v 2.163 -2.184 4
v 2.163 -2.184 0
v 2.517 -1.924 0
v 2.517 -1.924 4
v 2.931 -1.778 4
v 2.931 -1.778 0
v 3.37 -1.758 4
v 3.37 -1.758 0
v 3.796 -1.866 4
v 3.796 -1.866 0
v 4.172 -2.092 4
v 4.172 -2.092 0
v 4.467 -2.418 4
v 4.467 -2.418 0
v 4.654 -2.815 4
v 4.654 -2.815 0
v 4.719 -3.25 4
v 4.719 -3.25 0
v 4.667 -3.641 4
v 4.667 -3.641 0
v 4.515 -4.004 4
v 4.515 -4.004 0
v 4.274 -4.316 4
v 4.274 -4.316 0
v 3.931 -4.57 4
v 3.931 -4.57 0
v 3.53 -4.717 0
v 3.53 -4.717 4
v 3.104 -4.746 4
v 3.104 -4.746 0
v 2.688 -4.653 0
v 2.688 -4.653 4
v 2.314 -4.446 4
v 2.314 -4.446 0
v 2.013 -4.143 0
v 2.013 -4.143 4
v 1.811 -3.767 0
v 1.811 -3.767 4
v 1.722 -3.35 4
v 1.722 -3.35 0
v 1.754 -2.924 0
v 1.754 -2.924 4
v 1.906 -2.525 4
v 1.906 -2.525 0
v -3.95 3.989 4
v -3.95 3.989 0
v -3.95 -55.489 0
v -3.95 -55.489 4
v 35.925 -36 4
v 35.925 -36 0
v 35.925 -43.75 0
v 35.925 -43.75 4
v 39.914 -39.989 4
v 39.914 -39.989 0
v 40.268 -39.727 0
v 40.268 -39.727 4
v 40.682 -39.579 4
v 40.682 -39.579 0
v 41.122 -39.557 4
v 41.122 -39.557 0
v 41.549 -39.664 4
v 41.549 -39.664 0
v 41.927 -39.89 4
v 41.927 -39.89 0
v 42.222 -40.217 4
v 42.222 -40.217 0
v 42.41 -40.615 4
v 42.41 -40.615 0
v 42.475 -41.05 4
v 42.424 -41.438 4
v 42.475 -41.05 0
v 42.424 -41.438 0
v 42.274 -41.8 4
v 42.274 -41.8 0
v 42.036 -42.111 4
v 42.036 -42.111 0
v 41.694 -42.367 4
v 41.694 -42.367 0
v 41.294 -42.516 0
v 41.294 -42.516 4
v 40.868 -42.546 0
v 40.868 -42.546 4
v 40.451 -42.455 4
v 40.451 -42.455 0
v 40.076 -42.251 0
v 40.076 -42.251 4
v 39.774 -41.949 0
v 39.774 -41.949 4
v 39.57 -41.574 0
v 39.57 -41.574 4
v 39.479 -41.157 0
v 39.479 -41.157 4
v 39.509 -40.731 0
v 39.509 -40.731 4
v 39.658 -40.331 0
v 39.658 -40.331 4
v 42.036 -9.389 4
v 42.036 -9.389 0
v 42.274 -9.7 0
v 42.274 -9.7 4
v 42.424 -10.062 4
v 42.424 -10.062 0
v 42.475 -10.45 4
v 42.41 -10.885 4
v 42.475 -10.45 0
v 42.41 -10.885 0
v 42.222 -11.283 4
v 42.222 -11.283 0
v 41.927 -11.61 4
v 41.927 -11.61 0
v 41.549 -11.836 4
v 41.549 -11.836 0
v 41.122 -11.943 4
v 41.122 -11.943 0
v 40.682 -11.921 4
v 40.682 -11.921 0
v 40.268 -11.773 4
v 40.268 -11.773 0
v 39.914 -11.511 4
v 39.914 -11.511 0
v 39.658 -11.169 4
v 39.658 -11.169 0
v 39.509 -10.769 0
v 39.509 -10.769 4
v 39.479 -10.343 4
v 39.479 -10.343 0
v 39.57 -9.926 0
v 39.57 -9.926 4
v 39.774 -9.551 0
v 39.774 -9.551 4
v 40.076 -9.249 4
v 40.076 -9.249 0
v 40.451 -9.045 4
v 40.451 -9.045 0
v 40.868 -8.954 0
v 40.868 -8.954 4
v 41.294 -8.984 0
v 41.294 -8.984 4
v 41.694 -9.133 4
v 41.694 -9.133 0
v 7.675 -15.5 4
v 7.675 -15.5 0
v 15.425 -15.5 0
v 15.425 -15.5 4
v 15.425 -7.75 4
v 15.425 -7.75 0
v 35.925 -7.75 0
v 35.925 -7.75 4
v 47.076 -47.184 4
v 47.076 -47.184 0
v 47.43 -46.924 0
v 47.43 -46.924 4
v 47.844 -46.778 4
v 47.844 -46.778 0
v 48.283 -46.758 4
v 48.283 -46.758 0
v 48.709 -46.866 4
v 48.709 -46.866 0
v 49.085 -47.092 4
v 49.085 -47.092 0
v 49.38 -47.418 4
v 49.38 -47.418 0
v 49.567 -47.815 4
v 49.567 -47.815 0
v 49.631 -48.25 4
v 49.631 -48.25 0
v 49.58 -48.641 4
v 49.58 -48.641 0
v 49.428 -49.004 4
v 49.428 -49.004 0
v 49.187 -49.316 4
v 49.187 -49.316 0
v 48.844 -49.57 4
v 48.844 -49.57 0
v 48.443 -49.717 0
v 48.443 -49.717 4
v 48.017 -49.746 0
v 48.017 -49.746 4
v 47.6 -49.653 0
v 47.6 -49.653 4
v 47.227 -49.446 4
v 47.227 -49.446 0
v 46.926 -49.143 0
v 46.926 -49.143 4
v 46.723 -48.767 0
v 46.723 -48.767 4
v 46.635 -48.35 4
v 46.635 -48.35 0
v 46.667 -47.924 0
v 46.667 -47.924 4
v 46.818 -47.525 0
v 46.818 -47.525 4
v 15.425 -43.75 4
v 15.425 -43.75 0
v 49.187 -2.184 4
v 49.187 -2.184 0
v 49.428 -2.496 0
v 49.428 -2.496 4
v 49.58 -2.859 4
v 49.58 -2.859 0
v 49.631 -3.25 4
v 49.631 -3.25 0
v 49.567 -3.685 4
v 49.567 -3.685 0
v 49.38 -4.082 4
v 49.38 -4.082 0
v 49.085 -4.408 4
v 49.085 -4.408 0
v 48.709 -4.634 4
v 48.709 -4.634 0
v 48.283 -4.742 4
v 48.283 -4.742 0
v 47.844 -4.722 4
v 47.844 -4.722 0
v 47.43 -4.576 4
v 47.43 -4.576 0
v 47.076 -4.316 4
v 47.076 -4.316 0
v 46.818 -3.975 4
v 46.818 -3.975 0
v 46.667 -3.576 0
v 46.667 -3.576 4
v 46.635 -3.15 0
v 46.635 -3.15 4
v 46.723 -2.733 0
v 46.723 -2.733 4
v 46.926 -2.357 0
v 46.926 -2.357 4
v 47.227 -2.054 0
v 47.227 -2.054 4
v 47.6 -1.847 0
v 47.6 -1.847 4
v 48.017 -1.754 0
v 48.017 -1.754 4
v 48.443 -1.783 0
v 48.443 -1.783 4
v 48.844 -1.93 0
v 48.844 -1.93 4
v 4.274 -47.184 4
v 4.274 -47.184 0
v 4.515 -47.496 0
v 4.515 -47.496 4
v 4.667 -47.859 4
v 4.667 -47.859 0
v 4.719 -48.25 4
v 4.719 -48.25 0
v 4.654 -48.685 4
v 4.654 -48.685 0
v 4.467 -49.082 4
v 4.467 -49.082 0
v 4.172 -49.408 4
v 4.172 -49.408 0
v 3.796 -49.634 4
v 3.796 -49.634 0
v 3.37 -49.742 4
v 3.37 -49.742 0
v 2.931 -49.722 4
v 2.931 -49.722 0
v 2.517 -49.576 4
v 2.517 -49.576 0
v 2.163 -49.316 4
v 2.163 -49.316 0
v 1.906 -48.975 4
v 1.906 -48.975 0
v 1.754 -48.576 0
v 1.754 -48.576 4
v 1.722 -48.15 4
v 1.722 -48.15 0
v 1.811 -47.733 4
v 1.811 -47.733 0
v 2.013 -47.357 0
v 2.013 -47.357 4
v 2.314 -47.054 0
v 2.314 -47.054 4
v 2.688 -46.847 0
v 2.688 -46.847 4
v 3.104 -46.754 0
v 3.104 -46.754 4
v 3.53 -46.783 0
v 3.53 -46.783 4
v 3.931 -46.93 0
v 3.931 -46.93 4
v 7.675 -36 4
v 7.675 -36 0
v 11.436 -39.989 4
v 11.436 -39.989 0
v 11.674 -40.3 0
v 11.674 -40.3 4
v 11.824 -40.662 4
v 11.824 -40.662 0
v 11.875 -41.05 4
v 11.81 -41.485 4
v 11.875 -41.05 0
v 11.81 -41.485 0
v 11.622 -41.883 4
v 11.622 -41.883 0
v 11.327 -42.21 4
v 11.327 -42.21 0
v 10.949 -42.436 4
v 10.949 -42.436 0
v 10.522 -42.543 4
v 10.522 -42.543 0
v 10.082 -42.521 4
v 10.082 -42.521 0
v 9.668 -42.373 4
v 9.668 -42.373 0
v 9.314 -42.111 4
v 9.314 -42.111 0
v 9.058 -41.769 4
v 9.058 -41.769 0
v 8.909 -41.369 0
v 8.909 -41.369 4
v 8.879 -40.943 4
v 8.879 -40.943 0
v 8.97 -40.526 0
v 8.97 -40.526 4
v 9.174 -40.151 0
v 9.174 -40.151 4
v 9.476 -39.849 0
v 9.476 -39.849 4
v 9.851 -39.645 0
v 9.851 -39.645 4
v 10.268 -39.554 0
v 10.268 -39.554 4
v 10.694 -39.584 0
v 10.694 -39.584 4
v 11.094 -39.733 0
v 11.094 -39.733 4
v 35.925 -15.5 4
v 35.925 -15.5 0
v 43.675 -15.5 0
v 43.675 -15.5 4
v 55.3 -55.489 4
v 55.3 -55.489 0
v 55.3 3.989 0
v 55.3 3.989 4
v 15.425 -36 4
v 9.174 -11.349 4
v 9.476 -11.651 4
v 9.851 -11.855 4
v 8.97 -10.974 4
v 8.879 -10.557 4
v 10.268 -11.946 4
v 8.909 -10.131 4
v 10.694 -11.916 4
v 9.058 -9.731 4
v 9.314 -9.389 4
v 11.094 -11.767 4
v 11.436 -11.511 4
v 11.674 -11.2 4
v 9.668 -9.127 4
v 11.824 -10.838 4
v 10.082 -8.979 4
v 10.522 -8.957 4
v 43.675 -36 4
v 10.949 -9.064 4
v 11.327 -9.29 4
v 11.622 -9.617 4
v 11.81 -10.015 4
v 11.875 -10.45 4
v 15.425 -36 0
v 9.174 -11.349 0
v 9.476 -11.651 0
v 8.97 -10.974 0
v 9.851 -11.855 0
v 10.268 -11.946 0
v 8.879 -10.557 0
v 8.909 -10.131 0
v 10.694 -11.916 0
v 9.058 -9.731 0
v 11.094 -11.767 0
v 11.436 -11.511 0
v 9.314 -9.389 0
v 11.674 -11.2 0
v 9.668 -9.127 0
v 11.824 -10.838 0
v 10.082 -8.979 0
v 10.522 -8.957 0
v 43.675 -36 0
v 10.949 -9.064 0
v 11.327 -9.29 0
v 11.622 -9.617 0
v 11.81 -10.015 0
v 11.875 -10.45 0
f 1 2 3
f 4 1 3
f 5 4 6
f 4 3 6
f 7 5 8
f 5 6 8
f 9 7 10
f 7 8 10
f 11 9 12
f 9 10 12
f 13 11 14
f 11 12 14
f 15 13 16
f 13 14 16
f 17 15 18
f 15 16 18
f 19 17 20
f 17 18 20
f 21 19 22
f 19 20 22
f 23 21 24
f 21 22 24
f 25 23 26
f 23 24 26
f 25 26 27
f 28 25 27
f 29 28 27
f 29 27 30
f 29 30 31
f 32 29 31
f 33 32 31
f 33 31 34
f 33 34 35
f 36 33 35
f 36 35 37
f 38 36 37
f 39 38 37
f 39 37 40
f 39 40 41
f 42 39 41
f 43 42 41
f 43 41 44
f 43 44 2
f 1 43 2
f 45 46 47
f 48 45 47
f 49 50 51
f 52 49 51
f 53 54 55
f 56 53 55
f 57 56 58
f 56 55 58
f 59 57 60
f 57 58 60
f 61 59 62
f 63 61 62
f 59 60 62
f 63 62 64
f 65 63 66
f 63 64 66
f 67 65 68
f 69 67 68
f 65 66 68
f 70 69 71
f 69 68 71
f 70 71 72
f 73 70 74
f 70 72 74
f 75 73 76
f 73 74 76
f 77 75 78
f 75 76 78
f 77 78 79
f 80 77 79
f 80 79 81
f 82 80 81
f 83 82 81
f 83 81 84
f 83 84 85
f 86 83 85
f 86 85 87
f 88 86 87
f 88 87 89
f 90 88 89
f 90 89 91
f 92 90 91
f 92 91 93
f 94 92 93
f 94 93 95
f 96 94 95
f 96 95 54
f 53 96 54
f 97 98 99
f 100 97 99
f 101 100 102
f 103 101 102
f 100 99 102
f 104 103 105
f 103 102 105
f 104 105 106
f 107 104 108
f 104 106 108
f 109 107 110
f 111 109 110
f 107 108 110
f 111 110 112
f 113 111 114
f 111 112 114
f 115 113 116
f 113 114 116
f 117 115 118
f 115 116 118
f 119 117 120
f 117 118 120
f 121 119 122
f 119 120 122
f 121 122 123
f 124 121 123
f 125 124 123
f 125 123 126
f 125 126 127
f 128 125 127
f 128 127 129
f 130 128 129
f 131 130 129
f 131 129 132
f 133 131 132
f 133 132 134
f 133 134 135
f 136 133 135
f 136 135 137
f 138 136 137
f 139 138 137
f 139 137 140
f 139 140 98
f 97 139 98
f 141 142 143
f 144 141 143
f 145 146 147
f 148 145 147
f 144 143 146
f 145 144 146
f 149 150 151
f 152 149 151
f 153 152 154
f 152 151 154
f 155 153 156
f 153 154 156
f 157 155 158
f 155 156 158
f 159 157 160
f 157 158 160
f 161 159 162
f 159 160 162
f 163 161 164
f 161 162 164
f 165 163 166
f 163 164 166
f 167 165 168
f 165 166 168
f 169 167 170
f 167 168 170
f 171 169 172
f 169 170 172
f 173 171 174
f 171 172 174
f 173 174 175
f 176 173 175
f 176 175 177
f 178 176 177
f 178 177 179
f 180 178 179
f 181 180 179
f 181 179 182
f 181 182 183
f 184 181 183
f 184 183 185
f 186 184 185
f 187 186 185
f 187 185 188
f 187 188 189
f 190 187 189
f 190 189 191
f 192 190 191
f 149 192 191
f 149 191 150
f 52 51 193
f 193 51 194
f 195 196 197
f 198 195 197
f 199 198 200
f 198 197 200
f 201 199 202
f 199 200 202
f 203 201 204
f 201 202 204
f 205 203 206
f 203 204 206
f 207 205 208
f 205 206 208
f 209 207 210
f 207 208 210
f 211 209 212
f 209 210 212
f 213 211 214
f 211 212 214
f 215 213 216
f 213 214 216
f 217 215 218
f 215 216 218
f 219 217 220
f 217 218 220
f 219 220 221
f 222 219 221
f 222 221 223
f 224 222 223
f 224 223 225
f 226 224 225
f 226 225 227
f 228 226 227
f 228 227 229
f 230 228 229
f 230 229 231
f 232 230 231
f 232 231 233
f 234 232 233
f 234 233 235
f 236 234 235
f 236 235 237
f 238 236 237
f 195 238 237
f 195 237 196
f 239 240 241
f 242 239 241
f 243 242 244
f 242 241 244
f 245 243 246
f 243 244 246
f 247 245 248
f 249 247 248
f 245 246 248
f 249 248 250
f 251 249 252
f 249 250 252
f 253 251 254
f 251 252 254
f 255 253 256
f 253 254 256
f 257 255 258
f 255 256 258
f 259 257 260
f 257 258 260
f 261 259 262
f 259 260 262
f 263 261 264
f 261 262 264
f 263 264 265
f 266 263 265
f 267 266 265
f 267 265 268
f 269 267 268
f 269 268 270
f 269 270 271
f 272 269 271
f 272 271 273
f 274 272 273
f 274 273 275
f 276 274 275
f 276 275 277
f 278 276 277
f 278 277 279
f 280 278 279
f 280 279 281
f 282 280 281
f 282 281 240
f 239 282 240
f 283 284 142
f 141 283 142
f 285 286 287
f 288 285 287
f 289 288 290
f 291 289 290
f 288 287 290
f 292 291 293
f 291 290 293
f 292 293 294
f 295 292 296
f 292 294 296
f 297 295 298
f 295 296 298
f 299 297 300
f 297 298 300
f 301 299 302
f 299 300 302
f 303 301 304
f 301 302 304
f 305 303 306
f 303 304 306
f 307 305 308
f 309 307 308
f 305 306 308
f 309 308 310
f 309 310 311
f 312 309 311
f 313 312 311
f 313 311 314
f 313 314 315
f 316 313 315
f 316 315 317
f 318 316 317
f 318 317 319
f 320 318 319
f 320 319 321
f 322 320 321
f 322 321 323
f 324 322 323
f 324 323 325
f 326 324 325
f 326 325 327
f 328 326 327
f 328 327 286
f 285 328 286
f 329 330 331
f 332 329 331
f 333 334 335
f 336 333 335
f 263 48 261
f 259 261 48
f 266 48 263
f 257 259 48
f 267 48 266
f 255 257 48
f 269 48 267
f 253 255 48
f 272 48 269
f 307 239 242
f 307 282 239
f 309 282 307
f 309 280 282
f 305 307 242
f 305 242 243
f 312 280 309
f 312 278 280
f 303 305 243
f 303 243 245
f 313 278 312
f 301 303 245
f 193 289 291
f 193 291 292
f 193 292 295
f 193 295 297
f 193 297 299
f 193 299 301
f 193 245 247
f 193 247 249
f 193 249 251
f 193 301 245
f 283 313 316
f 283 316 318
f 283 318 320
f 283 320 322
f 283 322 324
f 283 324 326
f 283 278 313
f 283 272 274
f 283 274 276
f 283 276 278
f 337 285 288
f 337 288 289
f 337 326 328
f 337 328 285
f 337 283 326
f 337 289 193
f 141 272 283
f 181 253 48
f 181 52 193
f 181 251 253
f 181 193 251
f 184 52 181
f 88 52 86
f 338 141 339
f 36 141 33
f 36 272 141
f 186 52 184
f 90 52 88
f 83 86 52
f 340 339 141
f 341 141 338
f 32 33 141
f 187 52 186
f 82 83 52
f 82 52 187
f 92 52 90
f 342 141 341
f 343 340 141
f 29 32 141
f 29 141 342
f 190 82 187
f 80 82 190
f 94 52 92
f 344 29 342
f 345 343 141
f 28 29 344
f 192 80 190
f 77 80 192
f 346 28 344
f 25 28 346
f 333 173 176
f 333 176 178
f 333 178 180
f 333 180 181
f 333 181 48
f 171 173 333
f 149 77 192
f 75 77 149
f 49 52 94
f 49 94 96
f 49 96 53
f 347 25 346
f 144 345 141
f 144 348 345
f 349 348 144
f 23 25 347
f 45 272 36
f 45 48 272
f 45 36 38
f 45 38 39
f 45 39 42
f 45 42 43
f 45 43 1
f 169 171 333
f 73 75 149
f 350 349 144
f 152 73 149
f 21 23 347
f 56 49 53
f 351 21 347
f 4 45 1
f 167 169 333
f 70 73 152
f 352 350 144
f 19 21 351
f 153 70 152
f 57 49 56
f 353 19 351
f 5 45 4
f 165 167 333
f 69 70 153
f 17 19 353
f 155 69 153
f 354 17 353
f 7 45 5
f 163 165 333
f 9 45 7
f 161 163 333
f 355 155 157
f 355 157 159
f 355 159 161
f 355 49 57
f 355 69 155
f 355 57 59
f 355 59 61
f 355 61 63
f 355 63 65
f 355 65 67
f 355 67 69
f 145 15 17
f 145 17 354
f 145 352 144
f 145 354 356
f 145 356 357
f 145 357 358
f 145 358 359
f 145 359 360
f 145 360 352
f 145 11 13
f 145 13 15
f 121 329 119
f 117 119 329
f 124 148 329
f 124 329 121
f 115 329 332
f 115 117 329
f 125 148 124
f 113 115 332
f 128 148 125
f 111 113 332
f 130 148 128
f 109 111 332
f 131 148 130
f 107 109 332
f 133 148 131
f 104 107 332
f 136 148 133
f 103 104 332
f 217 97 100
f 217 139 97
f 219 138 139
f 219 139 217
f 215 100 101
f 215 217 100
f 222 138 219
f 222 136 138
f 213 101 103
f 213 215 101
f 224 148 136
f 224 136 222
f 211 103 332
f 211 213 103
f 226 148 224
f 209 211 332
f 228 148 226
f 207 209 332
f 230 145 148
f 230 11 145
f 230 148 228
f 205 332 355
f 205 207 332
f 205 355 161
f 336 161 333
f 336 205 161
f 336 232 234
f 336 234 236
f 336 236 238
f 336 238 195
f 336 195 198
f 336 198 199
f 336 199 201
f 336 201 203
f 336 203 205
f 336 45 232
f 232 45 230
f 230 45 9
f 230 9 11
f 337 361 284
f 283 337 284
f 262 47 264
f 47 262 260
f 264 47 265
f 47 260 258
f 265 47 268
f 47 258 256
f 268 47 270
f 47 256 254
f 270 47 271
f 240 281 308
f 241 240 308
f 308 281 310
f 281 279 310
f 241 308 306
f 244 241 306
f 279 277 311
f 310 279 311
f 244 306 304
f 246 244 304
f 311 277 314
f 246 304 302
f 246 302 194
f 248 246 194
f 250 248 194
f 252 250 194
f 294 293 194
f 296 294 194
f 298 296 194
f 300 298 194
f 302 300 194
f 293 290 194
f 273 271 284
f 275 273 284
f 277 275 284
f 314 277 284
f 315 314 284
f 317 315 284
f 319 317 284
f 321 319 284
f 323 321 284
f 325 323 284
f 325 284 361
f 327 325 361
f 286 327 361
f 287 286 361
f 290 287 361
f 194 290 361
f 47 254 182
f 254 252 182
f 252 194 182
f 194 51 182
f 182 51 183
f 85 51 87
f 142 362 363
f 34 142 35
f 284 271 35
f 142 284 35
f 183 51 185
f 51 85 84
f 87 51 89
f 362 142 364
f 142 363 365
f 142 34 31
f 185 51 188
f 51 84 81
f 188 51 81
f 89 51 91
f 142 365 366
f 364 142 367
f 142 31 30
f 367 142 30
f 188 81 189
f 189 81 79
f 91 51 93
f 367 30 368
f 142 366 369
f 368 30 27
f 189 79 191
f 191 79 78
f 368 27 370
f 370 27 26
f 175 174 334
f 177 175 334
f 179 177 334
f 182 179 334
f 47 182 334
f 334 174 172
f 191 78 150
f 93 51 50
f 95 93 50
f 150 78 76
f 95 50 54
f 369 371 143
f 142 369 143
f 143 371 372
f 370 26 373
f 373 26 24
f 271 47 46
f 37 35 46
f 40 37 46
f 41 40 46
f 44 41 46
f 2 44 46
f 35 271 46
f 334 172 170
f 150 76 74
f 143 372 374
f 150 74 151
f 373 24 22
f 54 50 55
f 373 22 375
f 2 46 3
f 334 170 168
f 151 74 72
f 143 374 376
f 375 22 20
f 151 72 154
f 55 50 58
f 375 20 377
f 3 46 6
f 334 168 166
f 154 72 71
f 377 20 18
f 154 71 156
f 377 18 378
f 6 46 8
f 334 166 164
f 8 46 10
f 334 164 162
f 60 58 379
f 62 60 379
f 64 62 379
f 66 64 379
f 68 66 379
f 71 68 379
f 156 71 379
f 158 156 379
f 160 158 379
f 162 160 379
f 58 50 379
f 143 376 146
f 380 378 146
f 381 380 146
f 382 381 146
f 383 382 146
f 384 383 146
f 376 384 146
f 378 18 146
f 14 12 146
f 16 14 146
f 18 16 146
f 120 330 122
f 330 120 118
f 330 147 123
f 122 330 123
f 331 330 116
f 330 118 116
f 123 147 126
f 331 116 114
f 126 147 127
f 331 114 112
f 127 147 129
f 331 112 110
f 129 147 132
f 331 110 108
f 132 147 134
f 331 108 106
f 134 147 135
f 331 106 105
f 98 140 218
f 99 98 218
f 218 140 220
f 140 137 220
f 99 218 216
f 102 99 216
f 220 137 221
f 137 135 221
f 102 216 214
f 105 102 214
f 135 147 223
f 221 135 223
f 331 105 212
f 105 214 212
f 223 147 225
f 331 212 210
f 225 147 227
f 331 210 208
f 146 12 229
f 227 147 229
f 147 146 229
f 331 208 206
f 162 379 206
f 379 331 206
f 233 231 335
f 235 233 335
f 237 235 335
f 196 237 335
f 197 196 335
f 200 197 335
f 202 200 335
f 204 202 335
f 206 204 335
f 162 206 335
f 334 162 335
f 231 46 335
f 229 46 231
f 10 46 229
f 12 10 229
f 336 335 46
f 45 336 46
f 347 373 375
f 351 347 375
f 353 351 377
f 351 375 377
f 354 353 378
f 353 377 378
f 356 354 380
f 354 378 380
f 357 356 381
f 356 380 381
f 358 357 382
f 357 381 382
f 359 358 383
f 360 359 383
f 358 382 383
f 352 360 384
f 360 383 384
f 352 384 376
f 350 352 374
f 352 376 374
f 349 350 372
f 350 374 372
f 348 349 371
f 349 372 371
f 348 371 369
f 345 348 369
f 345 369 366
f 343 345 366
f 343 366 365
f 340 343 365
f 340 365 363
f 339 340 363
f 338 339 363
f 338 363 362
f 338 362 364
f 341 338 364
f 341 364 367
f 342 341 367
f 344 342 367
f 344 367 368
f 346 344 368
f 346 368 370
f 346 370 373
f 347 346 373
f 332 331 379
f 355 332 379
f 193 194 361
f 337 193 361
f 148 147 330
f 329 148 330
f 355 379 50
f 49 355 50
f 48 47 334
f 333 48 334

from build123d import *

# Parameters (mm, degrees)
F1_DEPTH = 2
F2_DEPTH = 4


with BuildPart() as f1:
    # F0 (on Top) → F1 (new body)
    with BuildSketch(Plane.XY):
        Polygon((0, -7.75), (0, -43.674267101), (7.675, -43.674267101), (7.675, -36), (7.675, -25.75), (7.675, -15.5), (7.675, -7.75), align=None)
        with BuildLine():
            Line((0, 0), (0, -7.75))
            Line((0, -7.75), (7.675, -7.75))
            Line((7.675, -7.75), (4.2740389016, -4.3158047541))
            ThreePointArc((4.2740389016, -4.3158047541), (2.152743633, -4.3054905145), (2.1630578726, -2.1841952459))
            Line((2.1630578726, -2.1841952459), (0, 0))
        make_face()
        with BuildLine():
            Line((7.675, 0), (0, 0))
            Line((0, 0), (2.1630578726, -2.1841952459))
            ThreePointArc((2.1630578726, -2.1841952459), (3.7959409001, -1.8655803072), (4.7185483871, -3.25))
            ThreePointArc((4.7185483871, -3.25), (4.6029680799, -3.827392513), (4.2740389016, -4.3158047541))
            Line((4.2740389016, -4.3158047541), (7.675, -7.75))
            Line((7.675, -7.75), (7.675, 0))
        make_face()
        Polygon((7.675, 0), (7.675, -7.75), (15.425, -7.75), (25.675, -7.75), (35.925, -7.75), (43.6, -7.75), (43.6, 0), align=None)
        Polygon((43.675, -36), (43.675, -43.75), (51.35, -43.75), (51.35, -7.825732899), (43.675, -7.825732899), (43.675, -15.5), (43.675, -25.75), align=None)
        Polygon((43.6, -7.825732899), (43.675, -7.825732899), (43.675, -7.75), (43.6, -7.825), align=None)
        with BuildLine():
            Line((51.35, -7.825732899), (51.35, 0))
            Line((51.35, 0), (49.1869421274, -2.1841952459))
            ThreePointArc((49.1869421274, -2.1841952459), (49.5158713057, -2.672607487), (49.6314516129, -3.25))
            ThreePointArc((49.6314516129, -3.25), (48.7088441259, -4.6344196928), (47.0759610984, -4.3158047541))
            Line((47.0759610984, -4.3158047541), (43.675, -7.75))
            Line((43.675, -7.75), (43.675, -7.825732899))
            Line((43.675, -7.825732899), (51.35, -7.825732899))
        make_face()
        with BuildLine():
            Line((49.1869421274, -2.1841952459), (51.35, 0))
            Line((51.35, 0), (43.6, 0))
            Line((43.6, 0), (43.6, -7.75))
            Line((43.6, -7.75), (43.675, -7.75))
            Line((43.675, -7.75), (47.0759610984, -4.3158047541))
            ThreePointArc((47.0759610984, -4.3158047541), (47.0656468588, -2.1945094855), (49.1869421274, -2.1841952459))
        make_face()
        with BuildLine():
            Line((9.3143398282, -9.3893398282), (7.675, -7.75))
            Line((7.675, -7.75), (7.675, -15.5))
            Line((7.675, -15.5), (11.55, -11.625))
            Line((11.55, -11.625), (11.4356601718, -11.5106601718))
            ThreePointArc((11.4356601718, -11.5106601718), (9.3143398282, -11.5106601718), (9.3143398282, -9.3893398282))
        make_face()
        Polygon((11.55, -11.625), (7.675, -15.5), (15.425, -15.5), align=None)
        Polygon((15.425, -15.5), (15.425, -7.75), (11.55, -11.625), align=None)
        with BuildLine():
            Line((15.425, -7.75), (7.675, -7.75))
            Line((7.675, -7.75), (9.3143398282, -9.3893398282))
            ThreePointArc((9.3143398282, -9.3893398282), (10.9490251485, -9.0641807012), (11.875, -10.45))
            ThreePointArc((11.875, -10.45), (11.7608192988, -11.0240251485), (11.4356601718, -11.5106601718))
            Line((11.4356601718, -11.5106601718), (11.55, -11.625))
            Line((11.55, -11.625), (15.425, -7.75))
        make_face()
        Polygon((39.8, -39.875), (43.675, -36), (35.925, -36), align=None)
        Polygon((35.925, -36), (35.925, -43.75), (39.8, -39.875), align=None)
        with BuildLine():
            Line((35.925, -43.75), (43.675, -43.75))
            Line((43.675, -43.75), (42.0356601718, -42.1106601718))
            ThreePointArc((42.0356601718, -42.1106601718), (39.9143398282, -42.1106601718), (39.9143398282, -39.9893398282))
            Line((39.9143398282, -39.9893398282), (39.8, -39.875))
            Line((39.8, -39.875), (35.925, -43.75))
        make_face()
        Polygon((7.75, -43.75), (7.75, -51.5), (43.675, -51.5), (43.675, -43.75), (35.925, -43.75), (25.675, -43.75), (15.425, -43.75), align=None)
        with BuildLine():
            Line((42.0356601718, -42.1106601718), (43.675, -43.75))
            Line((43.675, -43.75), (43.675, -36))
            Line((43.675, -36), (39.8, -39.875))
            Line((39.8, -39.875), (39.9143398282, -39.9893398282))
            ThreePointArc((39.9143398282, -39.9893398282), (41.5490251485, -39.6641807012), (42.475, -41.05))
            ThreePointArc((42.475, -41.05), (42.3608192988, -41.6240251485), (42.0356601718, -42.1106601718))
        make_face()
        Polygon((7.675, -43.75), (7.75, -43.75), (7.75, -43.675), align=None)
        with BuildLine():
            Line((7.75, -43.675), (7.75, -43.75))
            Line((7.75, -43.75), (15.425, -43.75))
            Line((15.425, -43.75), (11.55, -39.875))
            Line((11.55, -39.875), (11.4356601718, -39.9893398282))
            ThreePointArc((11.4356601718, -39.9893398282), (11.7608192988, -40.4759748515), (11.875, -41.05))
            ThreePointArc((11.875, -41.05), (10.9490251485, -42.4358192988), (9.3143398282, -42.1106601718))
            Line((9.3143398282, -42.1106601718), (7.75, -43.675))
        make_face()
        Polygon((7.75, -43.674267101), (7.675, -43.674267101), (7.675, -43.75), (7.75, -43.675), align=None)
        with BuildLine():
            Line((7.675, -36), (7.675, -43.674267101))
            Line((7.675, -43.674267101), (7.75, -43.674267101))
            Line((7.75, -43.674267101), (7.75, -43.675))
            Line((7.75, -43.675), (9.3143398282, -42.1106601718))
            ThreePointArc((9.3143398282, -42.1106601718), (9.3143398282, -39.9893398282), (11.4356601718, -39.9893398282))
            Line((11.4356601718, -39.9893398282), (11.55, -39.875))
            Line((11.55, -39.875), (7.675, -36))
        make_face()
        with BuildLine():
            Line((0, -43.674267101), (0, -51.5))
            Line((0, -51.5), (2.1630578726, -49.3158047541))
            ThreePointArc((2.1630578726, -49.3158047541), (2.152743633, -47.1945094855), (4.2740389016, -47.1841952459))
            Line((4.2740389016, -47.1841952459), (7.675, -43.75))
            Line((7.675, -43.75), (7.675, -43.674267101))
            Line((7.675, -43.674267101), (0, -43.674267101))
        make_face()
        with BuildLine():
            Line((2.1630578726, -49.3158047541), (0, -51.5))
            Line((0, -51.5), (7.75, -51.5))
            Line((7.75, -51.5), (7.75, -43.75))
            Line((7.75, -43.75), (7.675, -43.75))
            Line((7.675, -43.75), (4.2740389016, -47.1841952459))
            ThreePointArc((4.2740389016, -47.1841952459), (4.6029680799, -47.672607487), (4.7185483871, -48.25))
            ThreePointArc((4.7185483871, -48.25), (3.7959409001, -49.6344196928), (2.1630578726, -49.3158047541))
        make_face()
        with BuildLine():
            Line((43.675, -43.75), (43.675, -51.5))
            Line((43.675, -51.5), (51.35, -51.5))
            Line((51.35, -51.5), (49.1869421274, -49.3158047541))
            ThreePointArc((49.1869421274, -49.3158047541), (47.0656468588, -49.3054905145), (47.0759610984, -47.1841952459))
            Line((47.0759610984, -47.1841952459), (43.675, -43.75))
        make_face()
        with BuildLine():
            Line((49.1869421274, -49.3158047541), (51.35, -51.5))
            Line((51.35, -51.5), (51.35, -43.75))
            Line((51.35, -43.75), (43.675, -43.75))
            Line((43.675, -43.75), (47.0759610984, -47.1841952459))
            ThreePointArc((47.0759610984, -47.1841952459), (48.7088441259, -46.8655803072), (49.6314516129, -48.25))
            ThreePointArc((49.6314516129, -48.25), (49.5158713057, -48.827392513), (49.1869421274, -49.3158047541))
        make_face()
        Polygon((15.425, -36), (7.675, -36), (11.55, -39.875), align=None)
        Polygon((11.55, -39.875), (15.425, -43.75), (15.425, -36), align=None)
        Polygon((39.8, -11.625), (35.925, -7.75), (35.925, -15.5), align=None)
        Polygon((35.925, -15.5), (43.675, -15.5), (39.8, -11.625), align=None)
        with BuildLine():
            Line((43.6, -7.825), (43.6, -7.75))
            Line((43.6, -7.75), (35.925, -7.75))
            Line((35.925, -7.75), (39.8, -11.625))
            Line((39.8, -11.625), (39.9143398282, -11.5106601718))
            ThreePointArc((39.9143398282, -11.5106601718), (39.9143398282, -9.3893398282), (42.0356601718, -9.3893398282))
            Line((42.0356601718, -9.3893398282), (43.6, -7.825))
        make_face()
        with BuildLine():
            Line((43.675, -15.5), (43.675, -7.825732899))
            Line((43.675, -7.825732899), (43.6, -7.825732899))
            Line((43.6, -7.825732899), (43.6, -7.825))
            Line((43.6, -7.825), (42.0356601718, -9.3893398282))
            ThreePointArc((42.0356601718, -9.3893398282), (42.3608192988, -9.8759748515), (42.475, -10.45))
            ThreePointArc((42.475, -10.45), (41.5490251485, -11.8358192988), (39.9143398282, -11.5106601718))
            Line((39.9143398282, -11.5106601718), (39.8, -11.625))
            Line((39.8, -11.625), (43.675, -15.5))
        make_face()
    extrude(amount=F1_DEPTH)

    # F0 (on Top) → F2 (join)
    with BuildSketch(Plane.XY):
        with BuildLine():
            Line((2.1630578726, -49.3158047541), (0, -51.5))
            Line((0, -51.5), (7.75, -51.5))
            Line((7.75, -51.5), (7.75, -43.75))
            Line((7.75, -43.75), (7.675, -43.75))
            Line((7.675, -43.75), (4.2740389016, -47.1841952459))
            ThreePointArc((4.2740389016, -47.1841952459), (4.6029680799, -47.672607487), (4.7185483871, -48.25))
            ThreePointArc((4.7185483871, -48.25), (3.7959409001, -49.6344196928), (2.1630578726, -49.3158047541))
        make_face()
        Polygon((-3.95, -55.4885993485), (0, -51.5), (0, -43.674267101), (0, -7.75), (0, 0), (-3.95, 3.9885993485), align=None)
        with BuildLine():
            Line((0, -43.674267101), (0, -51.5))
            Line((0, -51.5), (2.1630578726, -49.3158047541))
            ThreePointArc((2.1630578726, -49.3158047541), (2.152743633, -47.1945094855), (4.2740389016, -47.1841952459))
            Line((4.2740389016, -47.1841952459), (7.675, -43.75))
            Line((7.675, -43.75), (7.675, -43.674267101))
            Line((7.675, -43.674267101), (0, -43.674267101))
        make_face()
        Polygon((7.75, -51.5), (0, -51.5), (-3.95, -55.4885993485), (55.3, -55.4885993485), (51.35, -51.5), (43.675, -51.5), align=None)
        Polygon((7.75, -43.75), (7.75, -51.5), (43.675, -51.5), (43.675, -43.75), (35.925, -43.75), (25.675, -43.75), (15.425, -43.75), align=None)
        Polygon((0, -7.75), (0, -43.674267101), (7.675, -43.674267101), (7.675, -36), (7.675, -25.75), (7.675, -15.5), (7.675, -7.75), align=None)
        with BuildLine():
            Line((43.675, -43.75), (43.675, -51.5))
            Line((43.675, -51.5), (51.35, -51.5))
            Line((51.35, -51.5), (49.1869421274, -49.3158047541))
            ThreePointArc((49.1869421274, -49.3158047541), (47.0656468588, -49.3054905145), (47.0759610984, -47.1841952459))
            Line((47.0759610984, -47.1841952459), (43.675, -43.75))
        make_face()
        with BuildLine():
            Line((7.75, -43.675), (7.75, -43.75))
            Line((7.75, -43.75), (15.425, -43.75))
            Line((15.425, -43.75), (11.55, -39.875))
            Line((11.55, -39.875), (11.4356601718, -39.9893398282))
            ThreePointArc((11.4356601718, -39.9893398282), (11.7608192988, -40.4759748515), (11.875, -41.05))
            ThreePointArc((11.875, -41.05), (10.9490251485, -42.4358192988), (9.3143398282, -42.1106601718))
            Line((9.3143398282, -42.1106601718), (7.75, -43.675))
        make_face()
        Polygon((7.675, -43.75), (7.75, -43.75), (7.75, -43.675), align=None)
        with BuildLine():
            Line((0, 0), (0, -7.75))
            Line((0, -7.75), (7.675, -7.75))
            Line((7.675, -7.75), (4.2740389016, -4.3158047541))
            ThreePointArc((4.2740389016, -4.3158047541), (2.152743633, -4.3054905145), (2.1630578726, -2.1841952459))
            Line((2.1630578726, -2.1841952459), (0, 0))
        make_face()
        Polygon((7.75, -43.674267101), (7.675, -43.674267101), (7.675, -43.75), (7.75, -43.675), align=None)
        with BuildLine():
            Line((7.675, -36), (7.675, -43.674267101))
            Line((7.675, -43.674267101), (7.75, -43.674267101))
            Line((7.75, -43.674267101), (7.75, -43.675))
            Line((7.75, -43.675), (9.3143398282, -42.1106601718))
            ThreePointArc((9.3143398282, -42.1106601718), (9.3143398282, -39.9893398282), (11.4356601718, -39.9893398282))
            Line((11.4356601718, -39.9893398282), (11.55, -39.875))
            Line((11.55, -39.875), (7.675, -36))
        make_face()
        Polygon((51.35, -51.5), (55.3, -55.4885993485), (55.3, 3.9885993485), (51.35, 0), (51.35, -7.825732899), (51.35, -43.75), align=None)
        Polygon((55.3, 3.9885993485), (-3.95, 3.9885993485), (0, 0), (7.675, 0), (43.6, 0), (51.35, 0), align=None)
        with BuildLine():
            Line((49.1869421274, -49.3158047541), (51.35, -51.5))
            Line((51.35, -51.5), (51.35, -43.75))
            Line((51.35, -43.75), (43.675, -43.75))
            Line((43.675, -43.75), (47.0759610984, -47.1841952459))
            ThreePointArc((47.0759610984, -47.1841952459), (48.7088441259, -46.8655803072), (49.6314516129, -48.25))
            ThreePointArc((49.6314516129, -48.25), (49.5158713057, -48.827392513), (49.1869421274, -49.3158047541))
        make_face()
        with BuildLine():
            Line((42.0356601718, -42.1106601718), (43.675, -43.75))
            Line((43.675, -43.75), (43.675, -36))
            Line((43.675, -36), (39.8, -39.875))
            Line((39.8, -39.875), (39.9143398282, -39.9893398282))
            ThreePointArc((39.9143398282, -39.9893398282), (41.5490251485, -39.6641807012), (42.475, -41.05))
            ThreePointArc((42.475, -41.05), (42.3608192988, -41.6240251485), (42.0356601718, -42.1106601718))
        make_face()
        with BuildLine():
            Line((35.925, -43.75), (43.675, -43.75))
            Line((43.675, -43.75), (42.0356601718, -42.1106601718))
            ThreePointArc((42.0356601718, -42.1106601718), (39.9143398282, -42.1106601718), (39.9143398282, -39.9893398282))
            Line((39.9143398282, -39.9893398282), (39.8, -39.875))
            Line((39.8, -39.875), (35.925, -43.75))
        make_face()
        Polygon((43.675, -36), (43.675, -43.75), (51.35, -43.75), (51.35, -7.825732899), (43.675, -7.825732899), (43.675, -15.5), (43.675, -25.75), align=None)
        Polygon((11.55, -39.875), (15.425, -43.75), (15.425, -36), align=None)
        with BuildLine():
            Line((7.675, 0), (0, 0))
            Line((0, 0), (2.1630578726, -2.1841952459))
            ThreePointArc((2.1630578726, -2.1841952459), (3.7959409001, -1.8655803072), (4.7185483871, -3.25))
            ThreePointArc((4.7185483871, -3.25), (4.6029680799, -3.827392513), (4.2740389016, -4.3158047541))
            Line((4.2740389016, -4.3158047541), (7.675, -7.75))
            Line((7.675, -7.75), (7.675, 0))
        make_face()
        Polygon((7.675, 0), (7.675, -7.75), (15.425, -7.75), (25.675, -7.75), (35.925, -7.75), (43.6, -7.75), (43.6, 0), align=None)
        with BuildLine():
            Line((9.3143398282, -9.3893398282), (7.675, -7.75))
            Line((7.675, -7.75), (7.675, -15.5))
            Line((7.675, -15.5), (11.55, -11.625))
            Line((11.55, -11.625), (11.4356601718, -11.5106601718))
            ThreePointArc((11.4356601718, -11.5106601718), (9.3143398282, -11.5106601718), (9.3143398282, -9.3893398282))
        make_face()
        with BuildLine():
            Line((15.425, -7.75), (7.675, -7.75))
            Line((7.675, -7.75), (9.3143398282, -9.3893398282))
            ThreePointArc((9.3143398282, -9.3893398282), (10.9490251485, -9.0641807012), (11.875, -10.45))
            ThreePointArc((11.875, -10.45), (11.7608192988, -11.0240251485), (11.4356601718, -11.5106601718))
            Line((11.4356601718, -11.5106601718), (11.55, -11.625))
            Line((11.55, -11.625), (15.425, -7.75))
        make_face()
        Polygon((15.425, -36), (7.675, -36), (11.55, -39.875), align=None)
        Polygon((35.925, -36), (35.925, -43.75), (39.8, -39.875), align=None)
        Polygon((39.8, -39.875), (43.675, -36), (35.925, -36), align=None)
        Polygon((15.425, -15.5), (15.425, -7.75), (11.55, -11.625), align=None)
        Polygon((11.55, -11.625), (7.675, -15.5), (15.425, -15.5), align=None)
        with BuildLine():
            Line((49.1869421274, -2.1841952459), (51.35, 0))
            Line((51.35, 0), (43.6, 0))
            Line((43.6, 0), (43.6, -7.75))
            Line((43.6, -7.75), (43.675, -7.75))
            Line((43.675, -7.75), (47.0759610984, -4.3158047541))
            ThreePointArc((47.0759610984, -4.3158047541), (47.0656468588, -2.1945094855), (49.1869421274, -2.1841952459))
        make_face()
        with BuildLine():
            Line((51.35, -7.825732899), (51.35, 0))
            Line((51.35, 0), (49.1869421274, -2.1841952459))
            ThreePointArc((49.1869421274, -2.1841952459), (49.5158713057, -2.672607487), (49.6314516129, -3.25))
            ThreePointArc((49.6314516129, -3.25), (48.7088441259, -4.6344196928), (47.0759610984, -4.3158047541))
            Line((47.0759610984, -4.3158047541), (43.675, -7.75))
            Line((43.675, -7.75), (43.675, -7.825732899))
            Line((43.675, -7.825732899), (51.35, -7.825732899))
        make_face()
        Polygon((43.6, -7.825732899), (43.675, -7.825732899), (43.675, -7.75), (43.6, -7.825), align=None)
        with BuildLine():
            Line((43.675, -15.5), (43.675, -7.825732899))
            Line((43.675, -7.825732899), (43.6, -7.825732899))
            Line((43.6, -7.825732899), (43.6, -7.825))
            Line((43.6, -7.825), (42.0356601718, -9.3893398282))
            ThreePointArc((42.0356601718, -9.3893398282), (42.3608192988, -9.8759748515), (42.475, -10.45))
            ThreePointArc((42.475, -10.45), (41.5490251485, -11.8358192988), (39.9143398282, -11.5106601718))
            Line((39.9143398282, -11.5106601718), (39.8, -11.625))
            Line((39.8, -11.625), (43.675, -15.5))
        make_face()
        Polygon((35.925, -15.5), (43.675, -15.5), (39.8, -11.625), align=None)
        with BuildLine():
            Line((43.6, -7.825), (43.6, -7.75))
            Line((43.6, -7.75), (35.925, -7.75))
            Line((35.925, -7.75), (39.8, -11.625))
            Line((39.8, -11.625), (39.9143398282, -11.5106601718))
            ThreePointArc((39.9143398282, -11.5106601718), (39.9143398282, -9.3893398282), (42.0356601718, -9.3893398282))
            Line((42.0356601718, -9.3893398282), (43.6, -7.825))
        make_face()
        Polygon((43.675, -7.75), (43.6, -7.75), (43.6, -7.825), align=None)
        Polygon((39.8, -11.625), (35.925, -7.75), (35.925, -15.5), align=None)
    extrude(amount=F2_DEPTH)


solid = f1.part
